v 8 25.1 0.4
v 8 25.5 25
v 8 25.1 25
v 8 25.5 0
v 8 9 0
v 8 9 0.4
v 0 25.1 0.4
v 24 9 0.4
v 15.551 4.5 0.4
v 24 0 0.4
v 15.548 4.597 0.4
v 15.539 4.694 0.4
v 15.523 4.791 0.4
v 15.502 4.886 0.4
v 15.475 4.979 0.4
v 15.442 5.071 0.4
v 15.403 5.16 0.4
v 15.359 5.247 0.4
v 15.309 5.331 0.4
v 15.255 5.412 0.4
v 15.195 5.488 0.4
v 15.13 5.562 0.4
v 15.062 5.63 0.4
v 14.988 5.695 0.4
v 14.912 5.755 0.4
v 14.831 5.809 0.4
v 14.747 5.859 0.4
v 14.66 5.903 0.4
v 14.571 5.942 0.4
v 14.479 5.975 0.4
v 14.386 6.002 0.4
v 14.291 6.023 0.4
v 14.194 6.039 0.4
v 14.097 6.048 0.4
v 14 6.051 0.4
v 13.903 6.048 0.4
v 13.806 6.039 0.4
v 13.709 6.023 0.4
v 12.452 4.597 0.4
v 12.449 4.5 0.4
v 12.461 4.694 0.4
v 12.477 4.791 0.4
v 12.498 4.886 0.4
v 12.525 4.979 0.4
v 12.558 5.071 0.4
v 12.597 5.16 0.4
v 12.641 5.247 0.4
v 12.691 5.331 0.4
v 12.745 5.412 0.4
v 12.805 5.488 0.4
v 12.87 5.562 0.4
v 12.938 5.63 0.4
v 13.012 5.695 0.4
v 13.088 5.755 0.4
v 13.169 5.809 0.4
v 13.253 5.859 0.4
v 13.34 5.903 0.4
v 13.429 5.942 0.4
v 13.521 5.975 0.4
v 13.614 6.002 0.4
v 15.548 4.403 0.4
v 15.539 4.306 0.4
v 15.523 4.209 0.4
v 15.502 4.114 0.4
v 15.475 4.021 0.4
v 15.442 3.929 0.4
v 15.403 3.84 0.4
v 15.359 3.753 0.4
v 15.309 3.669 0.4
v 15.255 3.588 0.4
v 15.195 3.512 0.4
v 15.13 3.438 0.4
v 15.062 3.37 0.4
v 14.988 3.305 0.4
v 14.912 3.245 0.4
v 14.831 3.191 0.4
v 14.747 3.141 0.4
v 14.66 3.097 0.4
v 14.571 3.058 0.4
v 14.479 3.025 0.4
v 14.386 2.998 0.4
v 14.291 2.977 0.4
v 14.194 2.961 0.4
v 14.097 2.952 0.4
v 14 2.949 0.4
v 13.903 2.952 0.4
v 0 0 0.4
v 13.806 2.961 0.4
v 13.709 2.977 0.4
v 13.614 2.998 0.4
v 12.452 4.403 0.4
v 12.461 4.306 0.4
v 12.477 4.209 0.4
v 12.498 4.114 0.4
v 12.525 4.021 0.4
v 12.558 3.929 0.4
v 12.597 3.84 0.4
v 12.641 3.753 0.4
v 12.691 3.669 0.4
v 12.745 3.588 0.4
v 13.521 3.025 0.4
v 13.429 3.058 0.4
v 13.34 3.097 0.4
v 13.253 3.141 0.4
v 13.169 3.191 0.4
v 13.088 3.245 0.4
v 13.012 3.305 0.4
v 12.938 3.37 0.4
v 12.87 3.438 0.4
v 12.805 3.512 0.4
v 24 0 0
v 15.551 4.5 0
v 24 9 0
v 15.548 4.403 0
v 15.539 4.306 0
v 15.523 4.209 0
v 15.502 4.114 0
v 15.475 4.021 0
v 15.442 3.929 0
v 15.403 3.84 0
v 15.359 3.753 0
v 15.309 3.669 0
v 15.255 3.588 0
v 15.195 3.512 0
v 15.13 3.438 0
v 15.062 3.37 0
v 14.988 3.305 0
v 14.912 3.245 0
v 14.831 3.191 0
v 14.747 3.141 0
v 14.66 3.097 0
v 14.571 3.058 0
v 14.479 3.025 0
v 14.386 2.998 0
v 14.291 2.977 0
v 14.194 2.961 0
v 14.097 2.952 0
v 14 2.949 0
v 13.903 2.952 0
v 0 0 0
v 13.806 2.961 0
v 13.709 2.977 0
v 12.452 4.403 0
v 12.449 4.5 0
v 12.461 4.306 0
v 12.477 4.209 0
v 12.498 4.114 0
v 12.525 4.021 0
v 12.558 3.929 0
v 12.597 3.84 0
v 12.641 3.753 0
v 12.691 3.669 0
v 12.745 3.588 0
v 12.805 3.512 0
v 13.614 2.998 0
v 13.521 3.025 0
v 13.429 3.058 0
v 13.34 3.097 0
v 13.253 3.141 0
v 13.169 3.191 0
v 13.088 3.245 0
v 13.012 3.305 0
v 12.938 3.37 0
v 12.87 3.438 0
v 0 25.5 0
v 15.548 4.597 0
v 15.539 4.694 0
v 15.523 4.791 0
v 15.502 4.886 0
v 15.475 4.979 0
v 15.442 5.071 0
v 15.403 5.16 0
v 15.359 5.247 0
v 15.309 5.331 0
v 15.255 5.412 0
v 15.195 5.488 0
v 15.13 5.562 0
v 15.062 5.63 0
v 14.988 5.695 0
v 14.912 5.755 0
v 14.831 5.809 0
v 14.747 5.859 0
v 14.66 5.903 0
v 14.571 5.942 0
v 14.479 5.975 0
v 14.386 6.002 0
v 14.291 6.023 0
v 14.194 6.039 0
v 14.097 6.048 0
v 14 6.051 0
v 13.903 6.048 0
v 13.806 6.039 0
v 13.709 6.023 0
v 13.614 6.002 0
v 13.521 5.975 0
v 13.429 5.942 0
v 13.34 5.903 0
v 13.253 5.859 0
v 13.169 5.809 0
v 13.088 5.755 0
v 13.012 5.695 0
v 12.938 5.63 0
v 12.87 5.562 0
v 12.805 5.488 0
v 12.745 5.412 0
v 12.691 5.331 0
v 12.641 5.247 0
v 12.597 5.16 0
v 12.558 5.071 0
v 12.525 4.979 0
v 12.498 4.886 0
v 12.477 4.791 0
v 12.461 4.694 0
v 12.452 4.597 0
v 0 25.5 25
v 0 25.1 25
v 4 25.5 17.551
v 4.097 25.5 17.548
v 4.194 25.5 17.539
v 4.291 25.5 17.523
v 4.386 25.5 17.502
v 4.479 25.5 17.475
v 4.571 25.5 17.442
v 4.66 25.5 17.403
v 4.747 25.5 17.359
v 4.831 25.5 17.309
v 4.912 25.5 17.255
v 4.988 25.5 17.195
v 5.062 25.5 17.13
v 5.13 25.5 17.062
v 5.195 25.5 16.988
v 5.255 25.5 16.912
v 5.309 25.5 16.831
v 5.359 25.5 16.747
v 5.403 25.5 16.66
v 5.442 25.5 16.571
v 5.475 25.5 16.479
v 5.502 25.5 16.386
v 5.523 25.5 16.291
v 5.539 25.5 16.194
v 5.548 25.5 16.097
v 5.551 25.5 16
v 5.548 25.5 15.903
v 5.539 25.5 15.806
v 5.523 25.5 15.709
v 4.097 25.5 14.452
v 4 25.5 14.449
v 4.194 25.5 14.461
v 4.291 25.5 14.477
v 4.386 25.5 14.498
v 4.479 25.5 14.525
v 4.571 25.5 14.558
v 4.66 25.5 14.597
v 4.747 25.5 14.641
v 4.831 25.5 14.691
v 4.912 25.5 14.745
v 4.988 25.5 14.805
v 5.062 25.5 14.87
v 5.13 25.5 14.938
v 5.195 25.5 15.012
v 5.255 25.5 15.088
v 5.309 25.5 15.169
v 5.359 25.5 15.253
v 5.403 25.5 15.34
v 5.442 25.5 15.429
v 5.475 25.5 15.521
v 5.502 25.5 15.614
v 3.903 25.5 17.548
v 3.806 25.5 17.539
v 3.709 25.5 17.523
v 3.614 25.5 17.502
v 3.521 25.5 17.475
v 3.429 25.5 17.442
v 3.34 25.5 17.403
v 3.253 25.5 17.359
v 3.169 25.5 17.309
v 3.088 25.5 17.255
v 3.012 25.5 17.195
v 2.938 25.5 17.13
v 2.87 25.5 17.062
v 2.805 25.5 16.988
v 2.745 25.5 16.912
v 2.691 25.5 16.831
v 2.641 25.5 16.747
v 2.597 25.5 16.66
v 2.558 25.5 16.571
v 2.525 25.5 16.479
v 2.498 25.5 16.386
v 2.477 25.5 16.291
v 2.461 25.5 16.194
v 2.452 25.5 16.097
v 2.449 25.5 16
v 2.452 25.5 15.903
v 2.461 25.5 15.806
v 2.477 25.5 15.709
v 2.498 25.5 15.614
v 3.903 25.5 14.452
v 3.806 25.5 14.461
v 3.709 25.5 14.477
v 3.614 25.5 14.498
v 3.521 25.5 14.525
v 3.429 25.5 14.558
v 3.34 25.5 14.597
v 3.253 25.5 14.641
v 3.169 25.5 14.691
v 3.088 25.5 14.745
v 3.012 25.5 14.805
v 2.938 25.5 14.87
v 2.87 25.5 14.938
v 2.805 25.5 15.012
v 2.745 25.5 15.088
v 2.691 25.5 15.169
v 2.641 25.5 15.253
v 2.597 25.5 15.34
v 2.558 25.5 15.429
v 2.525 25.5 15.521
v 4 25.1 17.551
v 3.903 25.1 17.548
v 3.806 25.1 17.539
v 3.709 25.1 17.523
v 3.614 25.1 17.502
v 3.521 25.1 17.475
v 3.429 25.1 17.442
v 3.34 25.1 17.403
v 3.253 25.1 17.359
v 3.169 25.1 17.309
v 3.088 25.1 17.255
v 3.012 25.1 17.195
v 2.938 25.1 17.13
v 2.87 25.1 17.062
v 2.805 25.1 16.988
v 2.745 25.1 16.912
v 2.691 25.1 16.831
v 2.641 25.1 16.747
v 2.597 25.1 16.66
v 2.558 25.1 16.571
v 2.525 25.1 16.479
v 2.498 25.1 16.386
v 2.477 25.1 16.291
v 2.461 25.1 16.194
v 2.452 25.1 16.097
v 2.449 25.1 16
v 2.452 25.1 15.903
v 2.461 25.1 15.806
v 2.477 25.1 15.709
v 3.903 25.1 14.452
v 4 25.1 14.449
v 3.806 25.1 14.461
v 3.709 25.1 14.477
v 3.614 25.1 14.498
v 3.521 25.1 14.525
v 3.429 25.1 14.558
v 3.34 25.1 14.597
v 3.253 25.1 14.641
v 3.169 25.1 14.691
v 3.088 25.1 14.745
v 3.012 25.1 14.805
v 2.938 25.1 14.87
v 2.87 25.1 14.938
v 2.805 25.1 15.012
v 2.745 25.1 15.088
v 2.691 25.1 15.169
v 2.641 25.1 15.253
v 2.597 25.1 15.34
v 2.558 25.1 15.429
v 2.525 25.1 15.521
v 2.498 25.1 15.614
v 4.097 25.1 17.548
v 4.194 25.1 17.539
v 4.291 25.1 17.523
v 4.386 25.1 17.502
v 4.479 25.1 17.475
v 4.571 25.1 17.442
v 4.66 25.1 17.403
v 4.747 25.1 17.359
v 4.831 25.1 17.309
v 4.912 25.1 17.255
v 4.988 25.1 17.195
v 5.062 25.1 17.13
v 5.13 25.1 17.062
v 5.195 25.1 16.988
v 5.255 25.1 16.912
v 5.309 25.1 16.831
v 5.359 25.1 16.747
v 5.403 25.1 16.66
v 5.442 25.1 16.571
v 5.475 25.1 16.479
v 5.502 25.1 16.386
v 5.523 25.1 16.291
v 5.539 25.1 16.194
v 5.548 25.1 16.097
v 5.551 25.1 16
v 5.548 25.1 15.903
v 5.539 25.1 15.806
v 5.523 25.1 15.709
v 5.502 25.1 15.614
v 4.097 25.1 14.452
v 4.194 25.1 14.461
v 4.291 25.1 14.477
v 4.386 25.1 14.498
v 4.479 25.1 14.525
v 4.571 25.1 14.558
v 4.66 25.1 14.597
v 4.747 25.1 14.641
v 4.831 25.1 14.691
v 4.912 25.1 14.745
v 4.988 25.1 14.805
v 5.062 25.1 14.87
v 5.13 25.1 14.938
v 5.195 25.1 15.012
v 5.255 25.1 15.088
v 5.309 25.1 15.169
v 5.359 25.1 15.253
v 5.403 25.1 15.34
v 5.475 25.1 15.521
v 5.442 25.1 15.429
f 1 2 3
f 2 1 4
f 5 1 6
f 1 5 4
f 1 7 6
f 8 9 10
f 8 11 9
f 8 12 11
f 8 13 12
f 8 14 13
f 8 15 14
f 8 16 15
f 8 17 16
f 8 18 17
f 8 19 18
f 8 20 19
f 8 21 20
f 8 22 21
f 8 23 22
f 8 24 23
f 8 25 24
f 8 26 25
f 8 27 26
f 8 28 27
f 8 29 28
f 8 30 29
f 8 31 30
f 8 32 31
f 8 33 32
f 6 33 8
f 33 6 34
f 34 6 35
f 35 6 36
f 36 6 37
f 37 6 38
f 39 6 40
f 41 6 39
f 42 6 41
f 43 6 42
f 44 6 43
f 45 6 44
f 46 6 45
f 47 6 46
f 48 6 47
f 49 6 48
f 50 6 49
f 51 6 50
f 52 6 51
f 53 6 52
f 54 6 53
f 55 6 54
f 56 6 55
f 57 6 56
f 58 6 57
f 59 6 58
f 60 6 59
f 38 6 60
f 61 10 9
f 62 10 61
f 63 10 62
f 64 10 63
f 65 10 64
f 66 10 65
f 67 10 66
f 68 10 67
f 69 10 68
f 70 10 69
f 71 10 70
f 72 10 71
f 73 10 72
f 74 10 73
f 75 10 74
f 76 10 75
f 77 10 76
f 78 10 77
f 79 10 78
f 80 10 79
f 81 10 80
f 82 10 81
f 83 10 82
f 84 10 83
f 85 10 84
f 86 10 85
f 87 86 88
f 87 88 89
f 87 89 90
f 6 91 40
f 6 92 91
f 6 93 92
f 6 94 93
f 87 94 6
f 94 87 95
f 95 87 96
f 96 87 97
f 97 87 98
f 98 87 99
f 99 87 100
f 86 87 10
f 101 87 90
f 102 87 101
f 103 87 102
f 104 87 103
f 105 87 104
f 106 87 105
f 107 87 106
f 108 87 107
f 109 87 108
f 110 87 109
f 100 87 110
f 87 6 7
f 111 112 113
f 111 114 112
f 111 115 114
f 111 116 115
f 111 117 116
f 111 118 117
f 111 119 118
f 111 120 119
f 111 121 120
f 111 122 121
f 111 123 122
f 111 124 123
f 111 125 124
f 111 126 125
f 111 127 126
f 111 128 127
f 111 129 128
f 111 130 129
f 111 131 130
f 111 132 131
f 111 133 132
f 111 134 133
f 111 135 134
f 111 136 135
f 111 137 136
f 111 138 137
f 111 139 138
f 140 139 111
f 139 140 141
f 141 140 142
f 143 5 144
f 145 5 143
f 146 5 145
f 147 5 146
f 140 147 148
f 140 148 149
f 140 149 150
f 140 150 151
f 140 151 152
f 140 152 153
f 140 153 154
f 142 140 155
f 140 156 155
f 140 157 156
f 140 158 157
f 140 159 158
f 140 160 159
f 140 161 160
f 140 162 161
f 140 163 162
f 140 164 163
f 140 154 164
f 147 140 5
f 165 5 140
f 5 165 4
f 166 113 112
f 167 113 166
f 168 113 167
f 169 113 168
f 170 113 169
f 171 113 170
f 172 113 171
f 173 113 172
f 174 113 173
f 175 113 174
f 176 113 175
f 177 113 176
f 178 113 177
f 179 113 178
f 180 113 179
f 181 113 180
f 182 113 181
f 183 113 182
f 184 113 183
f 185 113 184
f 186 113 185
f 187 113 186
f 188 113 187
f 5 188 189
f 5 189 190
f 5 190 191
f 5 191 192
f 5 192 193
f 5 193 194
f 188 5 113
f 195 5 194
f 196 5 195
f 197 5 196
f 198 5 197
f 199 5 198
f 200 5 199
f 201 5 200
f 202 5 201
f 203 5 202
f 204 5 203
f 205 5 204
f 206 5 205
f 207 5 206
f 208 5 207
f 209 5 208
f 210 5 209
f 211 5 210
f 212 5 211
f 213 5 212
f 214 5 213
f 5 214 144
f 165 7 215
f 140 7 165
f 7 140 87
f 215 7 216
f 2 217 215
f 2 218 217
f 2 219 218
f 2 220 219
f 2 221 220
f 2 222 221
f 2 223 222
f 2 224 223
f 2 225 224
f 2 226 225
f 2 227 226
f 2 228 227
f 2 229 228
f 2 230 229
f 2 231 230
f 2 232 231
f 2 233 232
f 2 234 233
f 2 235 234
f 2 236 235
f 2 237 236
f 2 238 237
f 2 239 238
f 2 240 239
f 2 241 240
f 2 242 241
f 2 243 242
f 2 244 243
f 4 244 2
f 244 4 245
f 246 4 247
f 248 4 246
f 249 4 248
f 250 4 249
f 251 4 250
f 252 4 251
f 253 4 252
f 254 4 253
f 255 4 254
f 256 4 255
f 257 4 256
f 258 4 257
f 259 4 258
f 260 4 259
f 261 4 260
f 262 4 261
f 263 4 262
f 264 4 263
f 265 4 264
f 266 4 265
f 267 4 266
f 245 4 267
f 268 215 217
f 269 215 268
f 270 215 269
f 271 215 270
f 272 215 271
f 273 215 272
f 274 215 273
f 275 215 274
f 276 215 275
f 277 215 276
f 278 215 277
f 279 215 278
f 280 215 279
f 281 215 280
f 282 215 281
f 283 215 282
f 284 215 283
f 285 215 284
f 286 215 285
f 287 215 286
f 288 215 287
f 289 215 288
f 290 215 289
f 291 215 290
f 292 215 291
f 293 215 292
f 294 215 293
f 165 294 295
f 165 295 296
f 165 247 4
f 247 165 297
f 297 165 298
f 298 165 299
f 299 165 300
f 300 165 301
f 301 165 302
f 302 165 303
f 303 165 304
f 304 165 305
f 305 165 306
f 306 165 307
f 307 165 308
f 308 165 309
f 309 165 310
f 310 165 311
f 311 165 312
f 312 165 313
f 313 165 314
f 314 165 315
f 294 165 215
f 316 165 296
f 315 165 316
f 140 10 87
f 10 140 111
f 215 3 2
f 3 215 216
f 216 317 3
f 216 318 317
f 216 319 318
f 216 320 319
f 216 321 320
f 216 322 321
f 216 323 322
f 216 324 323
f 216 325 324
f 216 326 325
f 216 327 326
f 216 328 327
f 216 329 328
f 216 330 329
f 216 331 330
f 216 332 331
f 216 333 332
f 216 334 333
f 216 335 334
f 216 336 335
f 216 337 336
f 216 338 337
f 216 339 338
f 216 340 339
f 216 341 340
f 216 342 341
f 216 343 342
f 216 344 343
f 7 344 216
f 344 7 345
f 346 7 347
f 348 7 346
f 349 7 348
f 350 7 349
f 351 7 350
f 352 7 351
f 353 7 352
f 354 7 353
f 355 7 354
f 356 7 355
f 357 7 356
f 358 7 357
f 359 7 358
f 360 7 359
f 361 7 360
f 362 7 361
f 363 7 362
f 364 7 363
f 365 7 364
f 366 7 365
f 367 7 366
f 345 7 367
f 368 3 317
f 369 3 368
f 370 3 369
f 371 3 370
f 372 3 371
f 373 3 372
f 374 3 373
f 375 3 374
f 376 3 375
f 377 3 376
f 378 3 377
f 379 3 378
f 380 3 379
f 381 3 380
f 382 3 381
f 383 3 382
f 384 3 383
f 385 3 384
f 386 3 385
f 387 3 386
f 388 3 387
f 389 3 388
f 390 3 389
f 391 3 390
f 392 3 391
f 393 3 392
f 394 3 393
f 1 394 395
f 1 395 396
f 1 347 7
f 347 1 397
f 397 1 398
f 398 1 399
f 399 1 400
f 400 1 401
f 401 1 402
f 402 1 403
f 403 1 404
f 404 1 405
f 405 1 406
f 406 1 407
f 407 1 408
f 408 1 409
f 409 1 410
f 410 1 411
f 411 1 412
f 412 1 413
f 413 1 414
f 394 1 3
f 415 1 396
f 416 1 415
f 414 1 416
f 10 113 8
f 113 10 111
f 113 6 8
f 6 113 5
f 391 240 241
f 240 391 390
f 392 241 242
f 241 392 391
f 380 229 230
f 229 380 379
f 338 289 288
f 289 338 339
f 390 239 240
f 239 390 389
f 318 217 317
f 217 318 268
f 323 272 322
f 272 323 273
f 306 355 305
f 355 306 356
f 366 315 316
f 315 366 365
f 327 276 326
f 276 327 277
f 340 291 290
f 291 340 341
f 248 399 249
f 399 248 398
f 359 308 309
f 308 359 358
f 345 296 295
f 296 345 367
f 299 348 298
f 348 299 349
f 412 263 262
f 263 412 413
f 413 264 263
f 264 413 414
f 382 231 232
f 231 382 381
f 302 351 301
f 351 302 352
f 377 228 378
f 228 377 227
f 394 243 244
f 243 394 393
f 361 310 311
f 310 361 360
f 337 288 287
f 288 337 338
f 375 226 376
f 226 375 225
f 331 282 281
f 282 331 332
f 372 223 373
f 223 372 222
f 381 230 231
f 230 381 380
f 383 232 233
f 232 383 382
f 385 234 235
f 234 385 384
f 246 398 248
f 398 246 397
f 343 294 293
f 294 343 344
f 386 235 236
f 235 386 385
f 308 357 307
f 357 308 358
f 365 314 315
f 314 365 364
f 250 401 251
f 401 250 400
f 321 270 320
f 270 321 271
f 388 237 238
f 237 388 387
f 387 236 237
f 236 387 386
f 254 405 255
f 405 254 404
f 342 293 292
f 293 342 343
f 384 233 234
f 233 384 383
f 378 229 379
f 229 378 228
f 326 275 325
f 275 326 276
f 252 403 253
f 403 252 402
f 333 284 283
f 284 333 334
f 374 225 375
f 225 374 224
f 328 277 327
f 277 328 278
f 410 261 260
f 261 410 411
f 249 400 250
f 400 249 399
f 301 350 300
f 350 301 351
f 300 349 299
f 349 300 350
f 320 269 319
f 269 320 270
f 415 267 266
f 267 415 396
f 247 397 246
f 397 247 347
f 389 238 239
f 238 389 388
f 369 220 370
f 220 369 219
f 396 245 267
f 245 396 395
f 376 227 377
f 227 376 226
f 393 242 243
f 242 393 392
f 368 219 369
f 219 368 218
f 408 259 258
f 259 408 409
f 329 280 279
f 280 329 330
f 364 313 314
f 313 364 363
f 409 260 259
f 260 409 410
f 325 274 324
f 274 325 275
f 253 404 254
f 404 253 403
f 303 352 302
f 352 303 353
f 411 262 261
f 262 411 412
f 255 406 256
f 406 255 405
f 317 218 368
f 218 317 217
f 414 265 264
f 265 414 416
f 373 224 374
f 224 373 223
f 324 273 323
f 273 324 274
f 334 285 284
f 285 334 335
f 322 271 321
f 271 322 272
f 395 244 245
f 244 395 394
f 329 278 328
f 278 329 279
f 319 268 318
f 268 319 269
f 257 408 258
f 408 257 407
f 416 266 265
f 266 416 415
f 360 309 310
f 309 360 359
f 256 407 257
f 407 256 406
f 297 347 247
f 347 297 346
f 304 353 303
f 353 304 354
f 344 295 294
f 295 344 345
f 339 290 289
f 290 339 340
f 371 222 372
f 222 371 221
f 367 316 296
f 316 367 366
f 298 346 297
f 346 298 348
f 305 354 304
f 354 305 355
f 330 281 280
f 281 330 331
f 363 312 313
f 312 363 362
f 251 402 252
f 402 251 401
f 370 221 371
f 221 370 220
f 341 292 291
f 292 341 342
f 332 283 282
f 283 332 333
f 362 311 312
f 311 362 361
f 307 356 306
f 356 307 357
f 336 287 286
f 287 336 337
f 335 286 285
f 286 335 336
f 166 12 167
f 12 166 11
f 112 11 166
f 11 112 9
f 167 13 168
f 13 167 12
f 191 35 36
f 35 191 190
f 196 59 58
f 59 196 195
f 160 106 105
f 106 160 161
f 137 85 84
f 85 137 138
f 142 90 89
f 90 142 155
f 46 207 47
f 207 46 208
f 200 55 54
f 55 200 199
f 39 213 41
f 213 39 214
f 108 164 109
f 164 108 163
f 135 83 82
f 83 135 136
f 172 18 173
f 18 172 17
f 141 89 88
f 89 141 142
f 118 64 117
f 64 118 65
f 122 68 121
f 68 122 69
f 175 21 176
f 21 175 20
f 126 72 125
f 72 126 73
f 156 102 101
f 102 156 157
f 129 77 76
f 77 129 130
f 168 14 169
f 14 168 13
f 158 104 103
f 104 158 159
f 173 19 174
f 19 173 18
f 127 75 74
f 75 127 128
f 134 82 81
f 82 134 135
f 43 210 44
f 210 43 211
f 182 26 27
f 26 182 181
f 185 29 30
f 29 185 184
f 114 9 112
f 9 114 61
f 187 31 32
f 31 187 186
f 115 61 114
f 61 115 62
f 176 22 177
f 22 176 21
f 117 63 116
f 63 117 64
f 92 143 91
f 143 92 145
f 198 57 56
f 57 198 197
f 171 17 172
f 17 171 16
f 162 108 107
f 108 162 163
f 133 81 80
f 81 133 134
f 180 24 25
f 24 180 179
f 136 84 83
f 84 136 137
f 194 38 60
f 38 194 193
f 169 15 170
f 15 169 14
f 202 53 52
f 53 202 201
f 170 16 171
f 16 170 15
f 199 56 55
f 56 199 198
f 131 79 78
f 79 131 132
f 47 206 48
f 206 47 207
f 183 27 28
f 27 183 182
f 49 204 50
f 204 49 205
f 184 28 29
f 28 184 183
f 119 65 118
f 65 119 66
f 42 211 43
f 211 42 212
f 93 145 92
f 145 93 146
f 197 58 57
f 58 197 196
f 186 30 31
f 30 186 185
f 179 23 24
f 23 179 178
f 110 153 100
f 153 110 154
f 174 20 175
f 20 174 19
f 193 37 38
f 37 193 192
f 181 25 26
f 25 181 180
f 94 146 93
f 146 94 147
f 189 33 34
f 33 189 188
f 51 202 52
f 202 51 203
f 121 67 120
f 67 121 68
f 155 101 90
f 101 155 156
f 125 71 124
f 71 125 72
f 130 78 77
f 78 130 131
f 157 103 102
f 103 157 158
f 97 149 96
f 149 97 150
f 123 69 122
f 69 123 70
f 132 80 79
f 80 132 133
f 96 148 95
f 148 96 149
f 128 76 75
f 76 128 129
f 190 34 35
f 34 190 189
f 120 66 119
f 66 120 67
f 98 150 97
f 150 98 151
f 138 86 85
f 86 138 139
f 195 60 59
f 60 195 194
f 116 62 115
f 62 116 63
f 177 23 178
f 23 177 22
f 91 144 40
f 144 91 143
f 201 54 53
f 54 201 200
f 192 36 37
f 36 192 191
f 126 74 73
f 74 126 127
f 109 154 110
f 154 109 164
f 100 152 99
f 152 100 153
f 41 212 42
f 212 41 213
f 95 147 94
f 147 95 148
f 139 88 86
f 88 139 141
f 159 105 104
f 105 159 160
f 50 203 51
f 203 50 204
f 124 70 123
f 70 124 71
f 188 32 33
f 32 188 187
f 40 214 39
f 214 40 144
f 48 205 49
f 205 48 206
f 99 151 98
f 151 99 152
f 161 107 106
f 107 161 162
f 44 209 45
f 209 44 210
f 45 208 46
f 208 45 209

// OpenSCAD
SHORT_SCREW_DISTANCE = 4.5;
SCREW_BRACKET_PIN_WIDTH = 8;
PIN_SCREW_HEIGHT = 16;
SCREW_BRACKET_SHORT_LENGTH = 20;
SCREW_BRACKET_SHORT_WIDTH = SHORT_SCREW_DISTANCE * 2;
SHORT_SCREW_DEPTH_FROM_BACK = 21;
SCREW_BRACKET_DEPTH = SHORT_SCREW_DEPTH_FROM_BACK + SHORT_SCREW_DISTANCE;
HEIGHT = 25;
WALL_THICKNESS = 0.4;
M3_RADIUS = 3.1 / 2;

module hole(h, r, center, fn=100)
{
   fudge = 1/cos(180/fn);
   cylinder(h=h,r=r*fudge,center=center,$fn=fn);
}

difference()
{
	union()
	{
		cube([SCREW_BRACKET_PIN_WIDTH, SCREW_BRACKET_DEPTH, WALL_THICKNESS]);
		translate([0, SCREW_BRACKET_DEPTH - WALL_THICKNESS, 0])
		cube([SCREW_BRACKET_PIN_WIDTH, WALL_THICKNESS, HEIGHT]);
		
		translate([SCREW_BRACKET_PIN_WIDTH / 2, 0, 0])
		cube([SCREW_BRACKET_SHORT_LENGTH, SCREW_BRACKET_SHORT_WIDTH, WALL_THICKNESS]);
	}
	translate([SCREW_BRACKET_PIN_WIDTH / 2, SCREW_BRACKET_DEPTH + 0.1, PIN_SCREW_HEIGHT])
	rotate([90, 0, 0])
	hole(h=WALL_THICKNESS + 0.2, r=M3_RADIUS, center=false); 	

	translate([SCREW_BRACKET_PIN_WIDTH / 2 + SCREW_BRACKET_SHORT_LENGTH / 2, SCREW_BRACKET_DEPTH - SHORT_SCREW_DEPTH_FROM_BACK, -0.1])
	hole(h=WALL_THICKNESS + 0.2, r=M3_RADIUS, center=false);
}
